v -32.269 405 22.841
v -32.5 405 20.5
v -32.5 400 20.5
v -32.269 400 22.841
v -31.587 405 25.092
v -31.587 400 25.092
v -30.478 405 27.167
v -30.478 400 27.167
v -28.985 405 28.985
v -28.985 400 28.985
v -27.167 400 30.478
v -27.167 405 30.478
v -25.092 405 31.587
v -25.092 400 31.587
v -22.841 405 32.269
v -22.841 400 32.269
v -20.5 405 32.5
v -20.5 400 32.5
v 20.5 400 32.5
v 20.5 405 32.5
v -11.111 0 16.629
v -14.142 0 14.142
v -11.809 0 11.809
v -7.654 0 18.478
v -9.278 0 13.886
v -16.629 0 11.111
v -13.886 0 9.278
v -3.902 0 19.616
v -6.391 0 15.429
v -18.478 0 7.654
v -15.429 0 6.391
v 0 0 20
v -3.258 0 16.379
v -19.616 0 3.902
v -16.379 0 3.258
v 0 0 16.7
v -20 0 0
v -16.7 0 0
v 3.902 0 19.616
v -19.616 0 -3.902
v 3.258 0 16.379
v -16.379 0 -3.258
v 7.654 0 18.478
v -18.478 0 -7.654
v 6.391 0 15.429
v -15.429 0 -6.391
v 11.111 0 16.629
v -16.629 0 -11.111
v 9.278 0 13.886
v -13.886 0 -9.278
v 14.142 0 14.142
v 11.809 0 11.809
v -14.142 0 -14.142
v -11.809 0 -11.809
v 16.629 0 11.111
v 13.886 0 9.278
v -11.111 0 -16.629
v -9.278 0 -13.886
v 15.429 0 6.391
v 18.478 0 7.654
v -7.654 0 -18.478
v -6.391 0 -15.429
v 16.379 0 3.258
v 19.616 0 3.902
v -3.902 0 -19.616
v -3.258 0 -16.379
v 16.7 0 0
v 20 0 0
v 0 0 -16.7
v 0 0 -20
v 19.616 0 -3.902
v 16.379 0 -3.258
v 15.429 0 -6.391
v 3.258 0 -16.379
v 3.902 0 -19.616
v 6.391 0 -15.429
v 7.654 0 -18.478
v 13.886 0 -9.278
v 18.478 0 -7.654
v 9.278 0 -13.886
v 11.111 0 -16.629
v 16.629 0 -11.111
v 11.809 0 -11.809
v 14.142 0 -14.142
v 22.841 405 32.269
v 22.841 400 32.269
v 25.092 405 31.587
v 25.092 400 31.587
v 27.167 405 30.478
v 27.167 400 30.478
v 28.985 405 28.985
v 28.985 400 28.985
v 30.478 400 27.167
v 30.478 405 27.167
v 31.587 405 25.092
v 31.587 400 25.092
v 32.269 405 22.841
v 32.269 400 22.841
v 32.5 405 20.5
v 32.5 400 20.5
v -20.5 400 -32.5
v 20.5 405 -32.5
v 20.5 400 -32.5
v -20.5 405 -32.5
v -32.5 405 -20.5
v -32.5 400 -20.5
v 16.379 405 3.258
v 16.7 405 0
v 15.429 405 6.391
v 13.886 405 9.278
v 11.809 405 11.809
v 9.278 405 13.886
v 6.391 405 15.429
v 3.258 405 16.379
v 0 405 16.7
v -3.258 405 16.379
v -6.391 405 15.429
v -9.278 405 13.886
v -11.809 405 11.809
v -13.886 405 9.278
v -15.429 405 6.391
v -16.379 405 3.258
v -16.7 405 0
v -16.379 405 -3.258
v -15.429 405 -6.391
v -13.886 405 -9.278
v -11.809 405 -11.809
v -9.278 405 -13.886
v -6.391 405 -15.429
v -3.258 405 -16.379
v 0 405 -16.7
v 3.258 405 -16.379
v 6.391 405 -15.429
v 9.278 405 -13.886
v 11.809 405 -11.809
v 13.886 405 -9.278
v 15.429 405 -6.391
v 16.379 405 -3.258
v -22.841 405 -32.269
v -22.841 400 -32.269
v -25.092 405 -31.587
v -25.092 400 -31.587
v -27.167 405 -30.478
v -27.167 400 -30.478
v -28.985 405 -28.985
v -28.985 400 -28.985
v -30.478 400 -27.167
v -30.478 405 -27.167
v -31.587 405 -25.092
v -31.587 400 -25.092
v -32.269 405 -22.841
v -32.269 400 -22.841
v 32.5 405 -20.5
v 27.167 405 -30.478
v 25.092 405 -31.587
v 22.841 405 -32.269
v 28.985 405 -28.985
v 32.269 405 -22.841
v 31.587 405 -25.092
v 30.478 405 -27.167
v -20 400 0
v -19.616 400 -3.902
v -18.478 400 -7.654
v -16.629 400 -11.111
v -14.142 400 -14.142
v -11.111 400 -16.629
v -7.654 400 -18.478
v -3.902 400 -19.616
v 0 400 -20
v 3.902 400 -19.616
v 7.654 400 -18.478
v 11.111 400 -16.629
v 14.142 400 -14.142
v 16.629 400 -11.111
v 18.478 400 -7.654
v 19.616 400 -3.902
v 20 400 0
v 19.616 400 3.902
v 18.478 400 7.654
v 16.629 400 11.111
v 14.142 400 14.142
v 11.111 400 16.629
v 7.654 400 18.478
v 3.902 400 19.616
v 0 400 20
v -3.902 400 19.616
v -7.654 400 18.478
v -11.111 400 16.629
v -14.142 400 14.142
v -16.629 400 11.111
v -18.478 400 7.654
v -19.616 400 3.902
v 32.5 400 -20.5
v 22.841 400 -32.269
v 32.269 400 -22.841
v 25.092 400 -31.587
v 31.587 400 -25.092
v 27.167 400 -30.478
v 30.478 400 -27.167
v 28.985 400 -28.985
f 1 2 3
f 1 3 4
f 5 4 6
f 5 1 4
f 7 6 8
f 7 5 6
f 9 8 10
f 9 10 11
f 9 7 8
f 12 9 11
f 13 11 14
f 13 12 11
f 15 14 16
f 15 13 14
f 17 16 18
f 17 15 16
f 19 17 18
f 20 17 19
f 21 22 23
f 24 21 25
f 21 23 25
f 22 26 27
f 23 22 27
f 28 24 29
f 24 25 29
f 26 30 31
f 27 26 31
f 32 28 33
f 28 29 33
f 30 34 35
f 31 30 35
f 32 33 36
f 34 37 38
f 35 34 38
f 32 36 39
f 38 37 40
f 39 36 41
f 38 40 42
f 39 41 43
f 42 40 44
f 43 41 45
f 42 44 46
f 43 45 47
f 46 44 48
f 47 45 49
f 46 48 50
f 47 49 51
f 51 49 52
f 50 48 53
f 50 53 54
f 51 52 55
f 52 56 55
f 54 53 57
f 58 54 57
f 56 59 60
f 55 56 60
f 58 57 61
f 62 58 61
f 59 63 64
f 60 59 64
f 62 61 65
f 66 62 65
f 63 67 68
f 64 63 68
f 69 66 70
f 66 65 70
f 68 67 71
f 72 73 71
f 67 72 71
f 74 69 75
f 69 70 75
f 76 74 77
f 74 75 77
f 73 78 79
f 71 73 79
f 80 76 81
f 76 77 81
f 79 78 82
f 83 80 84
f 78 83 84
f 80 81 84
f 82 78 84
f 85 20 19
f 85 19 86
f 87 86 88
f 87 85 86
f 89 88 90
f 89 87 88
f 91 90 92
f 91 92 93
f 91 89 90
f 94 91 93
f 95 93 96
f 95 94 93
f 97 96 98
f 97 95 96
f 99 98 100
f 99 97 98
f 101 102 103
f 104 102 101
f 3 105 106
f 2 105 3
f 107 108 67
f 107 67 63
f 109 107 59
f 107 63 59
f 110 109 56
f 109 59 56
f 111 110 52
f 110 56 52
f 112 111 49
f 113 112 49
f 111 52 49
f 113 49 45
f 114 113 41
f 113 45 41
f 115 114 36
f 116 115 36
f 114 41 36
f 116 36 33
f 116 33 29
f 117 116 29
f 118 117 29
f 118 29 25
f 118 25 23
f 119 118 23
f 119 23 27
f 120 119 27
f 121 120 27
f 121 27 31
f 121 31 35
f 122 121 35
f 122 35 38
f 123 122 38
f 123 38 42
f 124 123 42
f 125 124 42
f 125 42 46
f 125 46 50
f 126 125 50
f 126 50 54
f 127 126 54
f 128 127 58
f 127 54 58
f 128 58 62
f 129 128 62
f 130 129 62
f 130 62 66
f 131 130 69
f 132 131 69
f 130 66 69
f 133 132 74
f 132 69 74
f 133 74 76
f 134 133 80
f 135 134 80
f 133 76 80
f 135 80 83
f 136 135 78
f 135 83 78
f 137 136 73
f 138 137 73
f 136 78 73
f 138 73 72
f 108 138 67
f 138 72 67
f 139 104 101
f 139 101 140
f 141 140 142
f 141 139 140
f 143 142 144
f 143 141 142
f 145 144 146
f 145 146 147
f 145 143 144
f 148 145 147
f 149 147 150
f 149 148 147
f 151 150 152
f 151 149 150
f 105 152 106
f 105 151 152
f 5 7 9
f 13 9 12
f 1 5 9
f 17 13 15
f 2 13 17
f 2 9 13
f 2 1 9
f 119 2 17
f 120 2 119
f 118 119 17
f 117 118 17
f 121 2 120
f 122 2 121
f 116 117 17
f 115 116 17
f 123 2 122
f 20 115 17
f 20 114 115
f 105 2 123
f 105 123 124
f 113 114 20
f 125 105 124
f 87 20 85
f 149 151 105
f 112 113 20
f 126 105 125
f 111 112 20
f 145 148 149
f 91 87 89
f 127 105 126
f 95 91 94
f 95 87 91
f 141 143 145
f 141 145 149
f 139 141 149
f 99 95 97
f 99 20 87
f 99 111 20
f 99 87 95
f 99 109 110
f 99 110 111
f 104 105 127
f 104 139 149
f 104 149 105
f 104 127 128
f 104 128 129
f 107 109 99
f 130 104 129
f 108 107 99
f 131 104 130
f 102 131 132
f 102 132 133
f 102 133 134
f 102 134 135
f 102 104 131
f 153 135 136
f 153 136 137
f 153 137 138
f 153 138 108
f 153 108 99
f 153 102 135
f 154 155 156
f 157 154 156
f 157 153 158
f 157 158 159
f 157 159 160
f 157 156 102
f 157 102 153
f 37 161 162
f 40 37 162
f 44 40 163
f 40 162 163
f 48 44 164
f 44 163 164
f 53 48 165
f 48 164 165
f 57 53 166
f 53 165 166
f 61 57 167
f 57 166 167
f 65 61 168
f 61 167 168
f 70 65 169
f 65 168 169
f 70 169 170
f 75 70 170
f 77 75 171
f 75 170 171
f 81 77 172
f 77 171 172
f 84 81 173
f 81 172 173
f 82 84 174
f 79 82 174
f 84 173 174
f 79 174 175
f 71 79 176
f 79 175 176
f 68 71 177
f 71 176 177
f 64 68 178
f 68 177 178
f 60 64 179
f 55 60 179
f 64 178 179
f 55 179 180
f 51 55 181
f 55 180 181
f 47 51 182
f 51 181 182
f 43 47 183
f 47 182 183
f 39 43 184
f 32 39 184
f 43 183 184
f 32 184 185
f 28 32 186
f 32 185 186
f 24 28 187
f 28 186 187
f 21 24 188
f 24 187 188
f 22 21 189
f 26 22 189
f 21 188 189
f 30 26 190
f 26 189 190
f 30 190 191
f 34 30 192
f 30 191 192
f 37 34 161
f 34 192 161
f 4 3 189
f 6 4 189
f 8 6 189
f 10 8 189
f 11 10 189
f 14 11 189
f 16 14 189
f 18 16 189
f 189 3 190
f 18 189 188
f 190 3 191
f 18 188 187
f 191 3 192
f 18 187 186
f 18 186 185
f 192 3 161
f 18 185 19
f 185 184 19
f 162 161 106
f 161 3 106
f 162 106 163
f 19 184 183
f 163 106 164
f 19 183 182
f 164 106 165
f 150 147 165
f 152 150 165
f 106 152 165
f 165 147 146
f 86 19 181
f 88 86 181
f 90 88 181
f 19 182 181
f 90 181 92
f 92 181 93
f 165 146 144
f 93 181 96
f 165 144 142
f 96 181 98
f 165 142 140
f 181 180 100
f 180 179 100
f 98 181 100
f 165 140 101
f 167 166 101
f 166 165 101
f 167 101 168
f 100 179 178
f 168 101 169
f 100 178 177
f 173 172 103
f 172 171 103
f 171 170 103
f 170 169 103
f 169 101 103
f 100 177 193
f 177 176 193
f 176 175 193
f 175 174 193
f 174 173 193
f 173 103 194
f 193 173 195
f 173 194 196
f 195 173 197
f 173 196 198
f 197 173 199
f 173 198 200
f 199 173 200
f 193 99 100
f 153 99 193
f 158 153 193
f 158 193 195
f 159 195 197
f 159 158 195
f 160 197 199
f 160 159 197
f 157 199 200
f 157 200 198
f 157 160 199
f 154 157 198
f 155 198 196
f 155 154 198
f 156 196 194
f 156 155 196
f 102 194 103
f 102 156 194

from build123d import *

# Parameters (mm, degrees)
SKETCH1_W           = 20
SKETCH1_H           = 405
BOSS_EXTRUDE1_DEPTH = 5
CUT_EXTRUDE1_REACH  = 409.6
SKETCH3_R           = 16.7


with BuildPart() as part:
    # Sketch1 → Revolve1 (revolve)
    with BuildSketch(Plane.XY, mode=Mode.PRIVATE) as revolve1_sk:
        with Locations((10, 202.5)):
            Rectangle(SKETCH1_W, SKETCH1_H)
    revolve(revolve1_sk.sketch.rotate(Axis((0, 405, 0), (0, -1, 0)), 180), axis=Axis((0, 405, 0), (0, -1, 0)))

    # Sketch2 → Boss-Extrude1 (add)
    with BuildSketch(Plane(origin=(0, 405, 0), x_dir=(1, 0, 0), z_dir=(0, 1, 0))):
        with BuildLine():
            Line((-20.5, -32.5), (20.5, -32.5))
            ThreePointArc((20.5, -32.5), (28.985281374, -28.985281374), (32.5, -20.5))
            Line((32.5, -20.5), (32.5, 20.5))
            ThreePointArc((32.5, 20.5), (28.985281374, 28.985281374), (20.5, 32.5))
            Line((20.5, 32.5), (-20.5, 32.5))
            ThreePointArc((-20.5, 32.5), (-28.985281374, 28.985281374), (-32.5, 20.5))
            Line((-32.5, 20.5), (-32.5, -20.5))
            ThreePointArc((-32.5, -20.5), (-28.985281374, -28.985281374), (-20.5, -32.5))
        make_face()
    extrude(amount=-BOSS_EXTRUDE1_DEPTH)

    # Sketch3 → Cut-Extrude1 (cut, up to next)
    with BuildSketch(Plane.XZ, mode=Mode.PRIVATE) as cut_extrude1_sk1:
        Circle(SKETCH3_R)
    cut_extrude1_tool1 = extrude(cut_extrude1_sk1.sketch, amount=-CUT_EXTRUDE1_REACH, mode=Mode.PRIVATE) & part.part
    add(cut_extrude1_tool1.solids().sort_by_distance((0, 0, 0))[0], mode=Mode.SUBTRACT)


solid = part.part
